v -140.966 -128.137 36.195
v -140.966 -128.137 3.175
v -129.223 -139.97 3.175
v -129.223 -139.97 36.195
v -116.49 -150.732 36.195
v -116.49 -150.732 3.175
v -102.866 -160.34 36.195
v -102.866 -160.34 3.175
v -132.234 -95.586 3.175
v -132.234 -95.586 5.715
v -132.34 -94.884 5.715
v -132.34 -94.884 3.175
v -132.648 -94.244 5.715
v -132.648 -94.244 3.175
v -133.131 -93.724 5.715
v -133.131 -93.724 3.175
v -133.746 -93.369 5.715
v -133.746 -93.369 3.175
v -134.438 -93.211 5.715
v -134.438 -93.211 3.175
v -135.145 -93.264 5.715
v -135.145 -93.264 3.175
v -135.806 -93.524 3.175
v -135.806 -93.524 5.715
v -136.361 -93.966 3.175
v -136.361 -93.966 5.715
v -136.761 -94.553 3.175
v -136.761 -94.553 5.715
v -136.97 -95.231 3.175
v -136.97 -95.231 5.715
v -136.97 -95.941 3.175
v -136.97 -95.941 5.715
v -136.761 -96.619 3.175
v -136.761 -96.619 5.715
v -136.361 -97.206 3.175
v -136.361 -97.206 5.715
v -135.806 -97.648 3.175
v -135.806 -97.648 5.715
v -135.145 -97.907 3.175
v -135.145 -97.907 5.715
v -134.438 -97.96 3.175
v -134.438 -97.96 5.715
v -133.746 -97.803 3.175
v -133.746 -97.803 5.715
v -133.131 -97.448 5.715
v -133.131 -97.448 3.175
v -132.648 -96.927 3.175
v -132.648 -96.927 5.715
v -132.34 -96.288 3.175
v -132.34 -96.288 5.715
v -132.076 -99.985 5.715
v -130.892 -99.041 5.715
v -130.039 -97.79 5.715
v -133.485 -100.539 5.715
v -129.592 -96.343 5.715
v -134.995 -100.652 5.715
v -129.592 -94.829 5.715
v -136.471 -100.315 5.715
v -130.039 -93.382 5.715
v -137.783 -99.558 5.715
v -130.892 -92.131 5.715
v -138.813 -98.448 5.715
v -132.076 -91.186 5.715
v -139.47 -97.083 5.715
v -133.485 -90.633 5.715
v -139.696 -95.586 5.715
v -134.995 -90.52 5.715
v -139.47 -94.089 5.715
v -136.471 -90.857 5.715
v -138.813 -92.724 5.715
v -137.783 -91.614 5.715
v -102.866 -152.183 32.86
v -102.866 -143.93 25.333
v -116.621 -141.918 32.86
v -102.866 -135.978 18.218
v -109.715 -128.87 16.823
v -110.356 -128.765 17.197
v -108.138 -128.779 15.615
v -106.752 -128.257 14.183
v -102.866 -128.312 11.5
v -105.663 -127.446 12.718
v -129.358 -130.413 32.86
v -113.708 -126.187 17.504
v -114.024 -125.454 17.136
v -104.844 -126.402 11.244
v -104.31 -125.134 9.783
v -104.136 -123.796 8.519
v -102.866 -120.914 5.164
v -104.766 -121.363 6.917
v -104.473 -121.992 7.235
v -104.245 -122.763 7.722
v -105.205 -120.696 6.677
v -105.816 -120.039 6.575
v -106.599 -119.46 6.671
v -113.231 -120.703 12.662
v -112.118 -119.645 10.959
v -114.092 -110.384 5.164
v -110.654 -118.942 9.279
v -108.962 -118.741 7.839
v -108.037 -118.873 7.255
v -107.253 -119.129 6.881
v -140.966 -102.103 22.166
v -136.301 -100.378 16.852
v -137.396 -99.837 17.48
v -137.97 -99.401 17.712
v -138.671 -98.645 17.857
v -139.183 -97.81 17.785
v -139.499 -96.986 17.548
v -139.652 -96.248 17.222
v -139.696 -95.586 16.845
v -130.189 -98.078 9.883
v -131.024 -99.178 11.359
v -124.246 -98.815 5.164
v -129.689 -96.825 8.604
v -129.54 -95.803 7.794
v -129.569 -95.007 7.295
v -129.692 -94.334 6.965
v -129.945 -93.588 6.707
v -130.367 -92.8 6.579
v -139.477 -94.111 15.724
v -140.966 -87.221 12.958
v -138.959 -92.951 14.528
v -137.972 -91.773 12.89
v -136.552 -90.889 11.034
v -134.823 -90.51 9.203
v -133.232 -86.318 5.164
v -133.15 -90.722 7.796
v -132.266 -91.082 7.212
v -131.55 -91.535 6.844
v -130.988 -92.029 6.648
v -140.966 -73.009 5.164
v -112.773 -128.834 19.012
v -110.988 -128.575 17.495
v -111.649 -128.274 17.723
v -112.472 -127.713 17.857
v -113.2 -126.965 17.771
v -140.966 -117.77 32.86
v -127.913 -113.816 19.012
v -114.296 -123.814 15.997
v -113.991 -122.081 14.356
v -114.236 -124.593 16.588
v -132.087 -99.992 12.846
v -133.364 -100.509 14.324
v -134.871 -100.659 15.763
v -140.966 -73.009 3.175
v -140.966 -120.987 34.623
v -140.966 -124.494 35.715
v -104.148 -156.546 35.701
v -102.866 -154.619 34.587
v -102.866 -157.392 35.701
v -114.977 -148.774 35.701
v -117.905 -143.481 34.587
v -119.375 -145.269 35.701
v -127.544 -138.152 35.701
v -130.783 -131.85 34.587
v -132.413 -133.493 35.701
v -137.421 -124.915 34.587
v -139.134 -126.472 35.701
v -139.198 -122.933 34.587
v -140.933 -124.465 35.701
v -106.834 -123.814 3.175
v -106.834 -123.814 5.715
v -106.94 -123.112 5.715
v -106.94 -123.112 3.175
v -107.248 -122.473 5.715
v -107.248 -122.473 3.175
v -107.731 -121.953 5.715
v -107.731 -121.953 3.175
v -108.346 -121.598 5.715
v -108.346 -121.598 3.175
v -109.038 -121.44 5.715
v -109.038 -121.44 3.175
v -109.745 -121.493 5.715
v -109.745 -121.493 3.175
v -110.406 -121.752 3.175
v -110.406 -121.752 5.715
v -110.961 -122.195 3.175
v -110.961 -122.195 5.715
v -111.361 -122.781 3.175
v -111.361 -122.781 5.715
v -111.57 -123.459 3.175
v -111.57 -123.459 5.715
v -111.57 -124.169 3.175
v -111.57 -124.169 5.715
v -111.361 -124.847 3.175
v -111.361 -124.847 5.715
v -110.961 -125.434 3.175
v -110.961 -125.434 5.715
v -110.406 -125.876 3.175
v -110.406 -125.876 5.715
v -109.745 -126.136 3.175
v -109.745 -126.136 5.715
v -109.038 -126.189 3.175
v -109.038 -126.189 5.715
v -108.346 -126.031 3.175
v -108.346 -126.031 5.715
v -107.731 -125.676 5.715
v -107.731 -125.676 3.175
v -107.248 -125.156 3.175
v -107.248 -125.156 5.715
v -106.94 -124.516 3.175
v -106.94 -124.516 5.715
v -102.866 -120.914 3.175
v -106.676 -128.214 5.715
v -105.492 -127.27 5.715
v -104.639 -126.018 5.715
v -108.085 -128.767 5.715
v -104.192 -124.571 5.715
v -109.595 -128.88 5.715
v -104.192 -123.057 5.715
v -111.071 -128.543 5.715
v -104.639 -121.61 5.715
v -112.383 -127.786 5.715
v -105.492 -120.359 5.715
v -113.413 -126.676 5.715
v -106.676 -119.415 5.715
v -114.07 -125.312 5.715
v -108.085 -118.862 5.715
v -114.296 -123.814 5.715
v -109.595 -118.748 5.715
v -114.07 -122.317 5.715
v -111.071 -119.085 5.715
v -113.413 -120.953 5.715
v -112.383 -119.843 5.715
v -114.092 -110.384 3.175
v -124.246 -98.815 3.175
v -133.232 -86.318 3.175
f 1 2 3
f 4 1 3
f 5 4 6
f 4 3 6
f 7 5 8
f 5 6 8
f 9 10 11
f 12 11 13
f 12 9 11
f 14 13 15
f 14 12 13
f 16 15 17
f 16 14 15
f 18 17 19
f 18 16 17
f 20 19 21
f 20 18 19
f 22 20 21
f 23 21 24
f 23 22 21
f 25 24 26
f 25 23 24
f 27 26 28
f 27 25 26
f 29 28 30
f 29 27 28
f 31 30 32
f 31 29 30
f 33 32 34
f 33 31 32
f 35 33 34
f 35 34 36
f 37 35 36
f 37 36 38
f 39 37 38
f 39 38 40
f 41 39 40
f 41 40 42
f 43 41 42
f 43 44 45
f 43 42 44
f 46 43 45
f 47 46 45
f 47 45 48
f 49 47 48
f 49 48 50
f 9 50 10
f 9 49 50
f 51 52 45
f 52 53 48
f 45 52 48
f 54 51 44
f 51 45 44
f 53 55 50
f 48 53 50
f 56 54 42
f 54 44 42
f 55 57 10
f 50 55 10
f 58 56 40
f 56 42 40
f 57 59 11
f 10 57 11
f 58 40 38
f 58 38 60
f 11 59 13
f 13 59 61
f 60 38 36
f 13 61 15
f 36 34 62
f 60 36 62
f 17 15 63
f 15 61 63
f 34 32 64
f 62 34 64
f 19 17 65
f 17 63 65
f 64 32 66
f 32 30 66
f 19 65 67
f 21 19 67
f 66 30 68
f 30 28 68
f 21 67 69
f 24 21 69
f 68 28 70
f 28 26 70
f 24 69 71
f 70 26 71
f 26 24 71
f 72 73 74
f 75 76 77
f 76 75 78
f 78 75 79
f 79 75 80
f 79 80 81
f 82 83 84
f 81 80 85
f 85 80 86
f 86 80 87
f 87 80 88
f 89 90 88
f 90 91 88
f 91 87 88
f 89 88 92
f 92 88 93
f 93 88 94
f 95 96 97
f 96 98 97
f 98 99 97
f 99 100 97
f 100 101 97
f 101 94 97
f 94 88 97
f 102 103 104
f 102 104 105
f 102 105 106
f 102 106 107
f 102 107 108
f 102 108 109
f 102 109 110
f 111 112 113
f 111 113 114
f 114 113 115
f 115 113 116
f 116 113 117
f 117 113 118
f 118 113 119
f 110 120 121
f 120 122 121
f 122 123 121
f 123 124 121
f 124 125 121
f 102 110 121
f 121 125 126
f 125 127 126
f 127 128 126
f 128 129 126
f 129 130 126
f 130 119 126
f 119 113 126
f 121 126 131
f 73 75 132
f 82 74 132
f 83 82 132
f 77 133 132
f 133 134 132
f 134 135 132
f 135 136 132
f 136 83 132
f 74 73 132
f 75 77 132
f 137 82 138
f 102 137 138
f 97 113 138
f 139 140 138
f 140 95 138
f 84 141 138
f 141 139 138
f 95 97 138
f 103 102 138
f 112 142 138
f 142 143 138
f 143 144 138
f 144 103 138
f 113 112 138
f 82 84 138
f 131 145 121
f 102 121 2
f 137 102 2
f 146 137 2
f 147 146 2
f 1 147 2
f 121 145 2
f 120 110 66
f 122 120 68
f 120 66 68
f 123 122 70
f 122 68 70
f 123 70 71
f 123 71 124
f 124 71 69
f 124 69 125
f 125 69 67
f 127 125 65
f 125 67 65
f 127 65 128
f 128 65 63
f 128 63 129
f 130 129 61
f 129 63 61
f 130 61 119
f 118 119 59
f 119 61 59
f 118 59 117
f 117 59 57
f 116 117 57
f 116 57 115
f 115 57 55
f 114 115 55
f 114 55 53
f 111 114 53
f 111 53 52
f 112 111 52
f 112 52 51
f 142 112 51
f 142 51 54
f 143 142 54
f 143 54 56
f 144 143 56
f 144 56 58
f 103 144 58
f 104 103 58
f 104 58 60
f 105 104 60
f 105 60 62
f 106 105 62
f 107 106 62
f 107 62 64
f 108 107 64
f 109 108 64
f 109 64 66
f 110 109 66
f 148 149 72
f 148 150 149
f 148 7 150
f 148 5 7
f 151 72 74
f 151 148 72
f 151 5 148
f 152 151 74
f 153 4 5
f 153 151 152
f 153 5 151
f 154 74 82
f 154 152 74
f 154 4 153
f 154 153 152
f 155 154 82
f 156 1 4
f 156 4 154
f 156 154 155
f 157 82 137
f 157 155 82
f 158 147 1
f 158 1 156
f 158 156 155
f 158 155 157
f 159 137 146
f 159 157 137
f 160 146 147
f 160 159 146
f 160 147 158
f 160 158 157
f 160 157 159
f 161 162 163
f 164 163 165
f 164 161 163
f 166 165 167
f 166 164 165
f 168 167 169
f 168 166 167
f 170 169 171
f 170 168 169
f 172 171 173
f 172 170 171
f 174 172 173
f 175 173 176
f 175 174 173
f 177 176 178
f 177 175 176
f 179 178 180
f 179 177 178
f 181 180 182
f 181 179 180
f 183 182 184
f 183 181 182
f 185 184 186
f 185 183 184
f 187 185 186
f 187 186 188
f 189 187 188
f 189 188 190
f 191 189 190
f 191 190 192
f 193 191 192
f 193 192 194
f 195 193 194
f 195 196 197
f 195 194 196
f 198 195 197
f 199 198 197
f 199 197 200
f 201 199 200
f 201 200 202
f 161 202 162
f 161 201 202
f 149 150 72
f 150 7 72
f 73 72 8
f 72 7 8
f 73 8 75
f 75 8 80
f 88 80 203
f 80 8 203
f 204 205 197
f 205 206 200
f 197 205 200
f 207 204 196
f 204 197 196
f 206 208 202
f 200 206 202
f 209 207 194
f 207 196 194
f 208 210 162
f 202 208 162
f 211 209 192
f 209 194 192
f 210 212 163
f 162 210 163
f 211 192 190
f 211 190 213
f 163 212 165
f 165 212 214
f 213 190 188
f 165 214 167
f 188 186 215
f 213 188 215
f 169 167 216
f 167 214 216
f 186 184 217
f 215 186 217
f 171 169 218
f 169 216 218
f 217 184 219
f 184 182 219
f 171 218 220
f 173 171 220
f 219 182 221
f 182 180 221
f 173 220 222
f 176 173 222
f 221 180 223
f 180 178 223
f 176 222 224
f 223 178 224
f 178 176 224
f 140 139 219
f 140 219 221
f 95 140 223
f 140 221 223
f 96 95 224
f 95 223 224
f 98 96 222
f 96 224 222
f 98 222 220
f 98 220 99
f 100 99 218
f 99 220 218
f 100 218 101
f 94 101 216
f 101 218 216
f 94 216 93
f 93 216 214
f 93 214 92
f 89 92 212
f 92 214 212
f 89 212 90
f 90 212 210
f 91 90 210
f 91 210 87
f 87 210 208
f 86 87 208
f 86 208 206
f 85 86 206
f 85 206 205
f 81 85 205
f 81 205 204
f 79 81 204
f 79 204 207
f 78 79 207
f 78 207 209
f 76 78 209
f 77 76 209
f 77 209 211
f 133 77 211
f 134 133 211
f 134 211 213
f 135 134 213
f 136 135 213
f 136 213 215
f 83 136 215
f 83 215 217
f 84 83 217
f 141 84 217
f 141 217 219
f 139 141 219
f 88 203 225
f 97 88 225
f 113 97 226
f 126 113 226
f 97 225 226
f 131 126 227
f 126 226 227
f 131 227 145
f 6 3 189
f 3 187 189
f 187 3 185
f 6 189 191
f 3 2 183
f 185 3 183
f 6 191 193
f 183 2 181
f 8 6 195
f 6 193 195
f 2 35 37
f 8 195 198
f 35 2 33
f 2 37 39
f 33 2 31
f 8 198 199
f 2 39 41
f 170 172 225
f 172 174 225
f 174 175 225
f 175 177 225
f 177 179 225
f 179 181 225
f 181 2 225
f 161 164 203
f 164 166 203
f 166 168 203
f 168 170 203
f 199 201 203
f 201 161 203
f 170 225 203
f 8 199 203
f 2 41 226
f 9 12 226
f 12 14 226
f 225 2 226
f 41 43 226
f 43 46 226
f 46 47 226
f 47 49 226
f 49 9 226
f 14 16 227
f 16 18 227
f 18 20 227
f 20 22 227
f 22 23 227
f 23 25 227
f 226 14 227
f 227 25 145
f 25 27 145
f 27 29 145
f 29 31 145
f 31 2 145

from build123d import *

# Parameters (mm, degrees)
SKETCH1_R               = 2.38125
BOSS_EXTRUDE1_DEPTH     = 3.175
BOSS_EXTRUDE2_DEPTH     = 50.8
CUT_EXTRUDE1_DEPTH      = 209.526843613
CUT_EXTRUDE1_DEPTH_BACK = 209.526843613
SKETCH3_R               = 203.829254644
SKETCH3_R_2             = 174.625
SKETCH5_R               = 2.38125
CUT_EXTRUDE3_DEPTH      = 200.484174202
SKETCH6_W               = 205.731089426
SKETCH6_H               = 25.4
BOSS_EXTRUDE3_DEPTH     = 3.175
SKETCH8_R               = 2.38125
CUT_EXTRUDE5_DEPTH      = 200.484174202
SKETCH9_W               = 205.731089426
SKETCH9_H               = 38.1
BOSS_EXTRUDE4_DEPTH     = 3.175
SKETCH10_R              = 6.35
SKETCH10_R_2            = 2.38125
CUT_EXTRUDE6_DEPTH      = 200.484174202
SKETCH11_W              = 53.331089426
SKETCH11_H              = 31.75
BOSS_EXTRUDE5_DEPTH     = 3.175
FILLET1_R               = 10.16
SKETCH12_R              = 6.35
SKETCH12_R_2            = 2.38125
CUT_EXTRUDE7_DEPTH      = 200.484174202
FILLET2_R               = 2.54
CUT_EXTRUDE8_DEPTH      = 200.484174202
SKETCH14_W              = 2.759281453
SKETCH14_H              = 7.963584416
SKETCH14_W_2            = 2.527010149
SKETCH14_H_2            = 5.938870156
BOSS_EXTRUDE6_DEPTH     = 3.175
FILLET3_R               = 2.54
SKETCH15_R              = 2.38125
BOSS_EXTRUDE7_DEPTH     = 33.02
SKETCH16_R              = 227.754671792
SKETCH16_W              = 368.539826918
SKETCH16_H              = 147.114866813
CUT_EXTRUDE9_DEPTH      = 217.033643064
SKETCH17_R              = 87.195519402
CUT_EXTRUDE10_DEPTH     = 217.033642998
CHAMFER1_SIZE           = 27.94
CHAMFER1_SIZE_2         = 31.030513664
CUT_EXTRUDE12_START     = -2.54
SKETCH18_R              = 5.08
CUT_EXTRUDE12_DEPTH     = 33.02
FILLET4_R               = 10.16


with BuildPart() as part:
    # Sketch1 → Boss-Extrude1 (new body)
    with BuildSketch(Plane.XY):
        with BuildLine():
            Line((-102.865544713, 31.75), (-102.865544713, 145.022480019))
            ThreePointArc((-102.865544713, 145.022480019), (-123.286100955, 128.114703728), (-140.965544713, 108.358457002))
            Line((-140.965544713, 108.358457002), (-140.965544713, -108.358457002))
            ThreePointArc((-140.965544713, -108.358457002), (-123.286100955, -128.114703728), (-102.865544713, -145.022480019))
            Line((-102.865544713, -145.022480019), (-102.865544713, -69.85))
            Line((-102.865544713, -69.85), (102.865544713, -69.85))
            Line((102.865544713, -69.85), (102.865544713, -145.022480019))
            ThreePointArc((102.865544713, -145.022480019), (123.286100955, -128.114703728), (140.965544713, -108.358457002))
            Line((140.965544713, -108.358457002), (140.965544713, 108.358457002))
            ThreePointArc((140.965544713, 108.358457002), (123.286100955, 128.114703728), (102.865544713, 145.022480019))
            Line((102.865544713, 145.022480019), (102.865544713, 31.75))
            Line((102.865544713, 31.75), (-102.865544713, 31.75))
        make_face()
        with Locations((25.4, -38.1)):
            Circle(SKETCH1_R, mode=Mode.SUBTRACT)
        with Locations((-25.4, -38.1)):
            Circle(SKETCH1_R, mode=Mode.SUBTRACT)
        with Locations((0, -38.1)):
            Circle(SKETCH1_R, mode=Mode.SUBTRACT)
    extrude(amount=BOSS_EXTRUDE1_DEPTH)

    # Sketch2 → Boss-Extrude2 (add)
    with BuildSketch(Plane.XY.offset(3.175)):
        with BuildLine():
            ThreePointArc((-102.865544713, -141.111907137), (-123.390730203, -123.566250752), (-140.965544713, -103.06602655))
            Line((-140.965544713, -103.06602655), (-140.965544713, -108.358457002))
            ThreePointArc((-140.965544713, -108.358457002), (-123.286100955, -128.114703728), (-102.865544713, -145.022480019))
            Line((-102.865544713, -145.022480019), (-102.865544713, -141.111907137))
        make_face()
        with BuildLine():
            ThreePointArc((140.965544713, -103.06602655), (123.390730203, -123.566250752), (102.865544713, -141.111907137))
            Line((102.865544713, -141.111907137), (102.865544713, -145.022480019))
            ThreePointArc((102.865544713, -145.022480019), (123.286100955, -128.114703728), (140.965544713, -108.358457002))
            Line((140.965544713, -108.358457002), (140.965544713, -103.06602655))
        make_face()
    extrude(amount=BOSS_EXTRUDE2_DEPTH)

    # Sketch3 → Cut-Extrude1 (cut, two sides: drawn at the far end of the back side and taken through both)
    with BuildSketch(Plane.XY.offset(3.175).offset(-CUT_EXTRUDE1_DEPTH_BACK)):
        Circle(SKETCH3_R)
        Circle(SKETCH3_R_2, mode=Mode.SUBTRACT)
    extrude(amount=CUT_EXTRUDE1_DEPTH + CUT_EXTRUDE1_DEPTH_BACK, mode=Mode.SUBTRACT)

    # Sketch5 → Cut-Extrude3 (cut, through all)
    with BuildSketch(Plane.XY.offset(3.175)):
        with Locations((134.615544713, -95.585904409)):
            Circle(SKETCH5_R)
        with Locations((109.215544713, -123.814275401)):
            Circle(SKETCH5_R)
        with Locations(Location((-134.615544713, -95.585904409, 0), (0, 0, 180))):
            Circle(SKETCH5_R)
        with Locations(Location((-109.215544713, -123.814275401, 0), (0, 0, 180))):
            Circle(SKETCH5_R)
    extrude(amount=-CUT_EXTRUDE3_DEPTH, mode=Mode.SUBTRACT)

    # Sketch6 → Boss-Extrude3 (add)
    with BuildSketch(Plane.XY.offset(3.175)):
        with Locations((0, 77.611907137)):
            Rectangle(SKETCH6_W, SKETCH6_H)
    extrude(amount=-BOSS_EXTRUDE3_DEPTH)

    # Sketch8 → Cut-Extrude5 (cut, through all)
    with BuildSketch(Plane.XY.offset(3.175)):
        with Locations((-38.1, -38.1)):
            Circle(SKETCH8_R)
        with Locations((-50.8, -38.1)):
            Circle(SKETCH8_R)
        with Locations((12.7, -38.1)):
            Circle(SKETCH8_R)
        with Locations((-12.7, -38.1)):
            Circle(SKETCH8_R)
    extrude(amount=-CUT_EXTRUDE5_DEPTH, mode=Mode.SUBTRACT)

    # Sketch9 → Boss-Extrude4 (add)
    with BuildSketch(Plane.XY.offset(3.175)):
        with Locations((0, -88.9)):
            Rectangle(SKETCH9_W, SKETCH9_H)
    extrude(amount=-BOSS_EXTRUDE4_DEPTH)

    # Sketch10 → Cut-Extrude6 (cut, through all)
    with BuildSketch(Plane.XY.offset(3.175)):
        with Locations((0, -76.2)):
            Circle(SKETCH10_R)
        with Locations((-25.4, -76.2)):
            Circle(SKETCH10_R_2)
        with Locations((-38.1, -76.2)):
            Circle(SKETCH10_R_2)
        with Locations((25.4, -76.2)):
            Circle(SKETCH10_R_2)
    extrude(amount=-CUT_EXTRUDE6_DEPTH, mode=Mode.SUBTRACT)

    # Sketch11 → Boss-Extrude5 (add)
    with BuildSketch(Plane.XY.offset(3.175)):
        with Locations((0, -123.825)):
            Rectangle(SKETCH11_W, SKETCH11_H)
    extrude(amount=-BOSS_EXTRUDE5_DEPTH)

    # Fillet1
    fillet1_edges = [part.edges().sort_by_distance(p)[0] for p in [
        (-26.665544713, -139.7, 1.5875),
        (-26.665544713, -107.95, 1.5875),
        (26.665544713, -107.95, 1.5875),
        (26.665544713, -139.7, 1.5875),
    ]]
    fillet(fillet1_edges, radius=FILLET1_R)

    # Sketch12 → Cut-Extrude7 (cut, through all)
    with BuildSketch(Plane.XY.offset(3.175)):
        with Locations((-25.4, -76.2)):
            Circle(SKETCH12_R)
        with Locations((25.4, -76.2)):
            Circle(SKETCH12_R)
        with Locations((-8.66775, -67.53225)):
            Circle(SKETCH12_R_2)
        with Locations((8.66775, -67.53225)):
            Circle(SKETCH12_R_2)
        with Locations((8.66775, -84.86775)):
            Circle(SKETCH12_R_2)
        with Locations((-8.66775, -84.86775)):
            Circle(SKETCH12_R_2)
    extrude(amount=-CUT_EXTRUDE7_DEPTH, mode=Mode.SUBTRACT)

    # Fillet2
    fillet2_edges = [part.edges().sort_by_distance(p)[0] for p in [
        (-102.865544713, 141.111907137, 1.5875),
        (102.865544713, 141.111907137, 1.5875),
    ]]
    fillet(fillet2_edges, radius=FILLET2_R)

    # Sketch13 → Cut-Extrude8 (cut, through all)
    # profile 1 of 4: a face of its own
    with BuildSketch(Plane.XY.offset(3.175)):
        with BuildLine():
            Line((-29.807958333, -15.810565048), (-38.216416667, -15.810565048))
            Line((-38.216416667, -15.810565048), (-33.538583333, 6.245101619))
            Line((-33.538583333, 6.245101619), (-38.803791667, 6.245101619))
            Line((-38.803791667, 6.245101619), (-39.682208333, 2.075268285))
            Line((-39.682208333, 2.075268285), (-48.095958333, 2.075268285))
            Line((-48.095958333, 2.075268285), (-47.397458333, 5.477809952))
            add(Edge.make_bspline(
                [(-47.397458333, 5.477809952), (-47.320569058, 5.758194134), (-47.170922216, 6.303895823), (-46.789013651, 7.053374007), (-46.29771223, 7.715065901), (-45.690436731, 8.272796577), (-45.006500067, 8.730292102), (-44.253147871, 9.054960677), (-43.448405111, 9.260244914), (-42.891974442, 9.282012228), (-42.6085, 9.293101619)],
                knots=[0, 0, 0, 0, 1.050168006, 2.043904372, 3.024673376, 4.01863537, 5.013909092, 5.989008141, 6.975497172, 8, 8, 8, 8], degree=3))
            Line((-42.6085, 9.293101619), (-24.463375, 9.293101619))
            Line((-24.463375, 9.293101619), (-29.807958333, -15.810565048))
        make_face()
    # profile 2 of 4: a face of its own
    with BuildSketch(Plane.XY.offset(3.175)):
        with BuildLine():
            add(Edge.make_bspline(
                [(-3.566583333, -12.132856715), (-3.643765668, -12.421811436), (-3.79437451, -12.985659844), (-4.17293599, -13.764550451), (-4.665381385, -14.453577746), (-5.270434906, -15.036263062), (-5.950809803, -15.518035961), (-6.703009887, -15.859816489), (-7.511777843, -16.068702787), (-8.070292693, -16.093985699), (-8.355541667, -16.106898381)],
                knots=[0, 0, 0, 0, 1.062369753, 2.073042759, 3.062499936, 4.061251344, 5.048575831, 6.014824268, 6.986115874, 8, 8, 8, 8], degree=3))
            Line((-8.355541667, -16.106898381), (-22.547791667, -16.106898381))
            add(Edge.make_bspline(
                [(-22.547791667, -16.106898381), (-22.69262218, -16.104596964), (-22.972752339, -16.100145578), (-23.378206431, -16.044702396), (-23.755568174, -15.960682303), (-24.107157142, -15.846746121), (-24.426210233, -15.691540895), (-24.716954418, -15.504453058), (-24.976786635, -15.281711317), (-25.203806964, -15.025677099), (-25.40308213, -14.746169713), (-25.554358436, -14.435544628), (-25.674211179, -14.106195373), (-25.74344938, -13.752832717), (-25.791514529, -13.37950469), (-25.77975916, -12.981941289), (-25.73922686, -12.562383844), (-25.682974686, -12.278883611), (-25.654, -12.132856715)],
                knots=[0, 0, 0, 0, 1.158779845, 2.241303809, 3.269110906, 4.251580925, 5.192683609, 6.101443689, 7.012833415, 7.922909267, 8.835720222, 9.751475912, 10.680528402, 11.633319635, 12.628295421, 13.687540584, 14.808885378, 16, 16, 16, 16], degree=3))
            Line((-25.654, -12.132856715), (-21.997458333, 5.319059952))
            add(Edge.make_bspline(
                [(-21.997458333, 5.319059952), (-21.920272116, 5.608009048), (-21.769655695, 6.171846477), (-21.391148554, 6.950815808), (-20.898502375, 7.639552216), (-20.293153244, 8.224337096), (-19.608609326, 8.702683082), (-18.855913228, 9.046275843), (-18.048644228, 9.254382857), (-17.4919553, 9.28003834), (-17.2085, 9.293101619)],
                knots=[0, 0, 0, 0, 1.062516124, 2.073328378, 3.062921881, 4.061810895, 5.05442655, 6.020808115, 6.992233544, 8, 8, 8, 8], degree=3))
            Line((-17.2085, 9.293101619), (-3.01625, 9.293101619))
            add(Edge.make_bspline(
                [(-3.01625, 9.293101619), (-2.871419505, 9.290800192), (-2.591289383, 9.286348788), (-2.185835038, 9.230905733), (-1.808474182, 9.146885197), (-1.456882118, 9.03295056), (-1.137839887, 8.877739913), (-0.847056821, 8.690671483), (-0.587369032, 8.467857656), (-0.359809395, 8.212092615), (-0.16209325, 7.930921186), (-0.002983257, 7.623293687), (0.114459046, 7.2921344), (0.187047795, 6.939473562), (0.223589985, 6.565305639), (0.223678302, 6.168188246), (0.179743785, 5.748571863), (0.123975462, 5.465081675), (0.09525, 5.319059952)],
                knots=[0, 0, 0, 0, 1.158432062, 2.24063113, 3.268129752, 4.250304904, 5.191125136, 6.099612471, 7.010728663, 7.920531375, 8.833068369, 9.75494936, 10.683723015, 11.636228288, 12.62940148, 13.688234619, 14.809242866, 16, 16, 16, 16], degree=3))
            Line((0.09525, 5.319059952), (-3.566583333, -12.132856715))
        make_face()
        Polygon((-13.403791667, 6.245101619), (-17.425458333, -13.058898381), (-12.16025, -13.058898381), (-8.138583333, 6.245101619), align=None, mode=Mode.SUBTRACT)
    # profile 3 of 4: a face of its own
    with BuildSketch(Plane.XY.offset(3.175)):
        with BuildLine():
            Line((11.557, 9.293101619), (8.556625, -5.269565048))
            Line((8.556625, -5.269565048), (13.827125, -5.269565048))
            Line((13.827125, -5.269565048), (16.8275, 9.293101619))
            Line((16.8275, 9.293101619), (25.235958333, 9.293101619))
            Line((25.235958333, 9.293101619), (19.896666667, -16.106898381))
            Line((19.896666667, -16.106898381), (11.482916667, -16.106898381))
            Line((11.482916667, -16.106898381), (13.165666667, -8.317565048))
            Line((13.165666667, -8.317565048), (3.439583333, -8.317565048))
            add(Edge.make_bspline(
                [(3.439583333, -8.317565048), (3.294736233, -8.315312365), (3.014573993, -8.310955241), (2.609344629, -8.25485176), (2.230636814, -8.173029355), (1.881290806, -8.050712181), (1.561052368, -7.897312045), (1.270346477, -7.709804396), (1.009103929, -7.48515858), (0.777806767, -7.227358437), (0.580756638, -6.941550122), (0.426179112, -6.6292081), (0.309007624, -6.297036788), (0.237889907, -5.94070984), (0.190785312, -5.563660832), (0.202000265, -5.162620664), (0.243321079, -4.739613917), (0.29915982, -4.45427987), (0.328083333, -4.306481715)],
                knots=[0, 0, 0, 0, 1.152191709, 2.228561082, 3.250524676, 4.231939746, 5.167691878, 6.071285285, 6.977493388, 7.902223819, 8.821393841, 9.731943086, 10.66895861, 11.616332835, 12.619603957, 13.686867372, 14.801836863, 16, 16, 16, 16], degree=3))
            Line((0.328083333, -4.306481715), (3.14325, 9.293101619))
            Line((3.14325, 9.293101619), (11.557, 9.293101619))
        make_face()
    # profile 4 of 4: a face of its own
    with BuildSketch(Plane.XY.offset(3.175)):
        with BuildLine():
            Line((33.374541667, -13.058898381), (47.0535, -13.058898381))
            Line((47.0535, -13.058898381), (46.392041667, -16.106898381))
            Line((46.392041667, -16.106898381), (24.304625, -16.106898381))
            Line((24.304625, -16.106898381), (25.802166667, -9.143065048))
            add(Edge.make_bspline(
                [(25.802166667, -9.143065048), (25.879273752, -8.861031474), (26.029757165, -8.310610268), (26.410334887, -7.552072135), (26.901419327, -6.879703753), (27.508831265, -6.311820899), (28.191228528, -5.842472815), (28.946271137, -5.513745702), (29.752164487, -5.300517366), (30.311046908, -5.28002739), (30.596416667, -5.269565048)],
                knots=[0, 0, 0, 0, 1.049169808, 2.047576474, 3.031944376, 4.027910562, 5.023553593, 5.994653504, 6.976054309, 8, 8, 8, 8], degree=3))
            Line((30.596416667, -5.269565048), (40.3225, -5.269565048))
            Line((40.3225, -5.269565048), (42.661416667, 6.245101619))
            Line((42.661416667, 6.245101619), (37.396208333, 6.245101619))
            Line((37.396208333, 6.245101619), (36.517791667, 2.075268285))
            Line((36.517791667, 2.075268285), (28.104041667, 2.075268285))
            Line((28.104041667, 2.075268285), (28.802541667, 5.477809952))
            add(Edge.make_bspline(
                [(28.802541667, 5.477809952), (28.879430942, 5.758194134), (29.029077784, 6.303895823), (29.410986349, 7.053374007), (29.90228777, 7.715065901), (30.509563269, 8.272796577), (31.193499933, 8.730292102), (31.946852129, 9.054960677), (32.751594889, 9.260244914), (33.308025558, 9.282012228), (33.5915, 9.293101619)],
                knots=[0, 0, 0, 0, 1.050168006, 2.043904372, 3.024673376, 4.01863537, 5.013909092, 5.989008141, 6.975497172, 8, 8, 8, 8], degree=3))
            Line((33.5915, 9.293101619), (47.78375, 9.293101619))
            add(Edge.make_bspline(
                [(47.78375, 9.293101619), (47.92859726, 9.290849086), (48.208759811, 9.286492252), (48.613987002, 9.230386738), (48.992702458, 9.148571481), (49.342021711, 9.026229282), (49.662353678, 8.87291663), (49.952725098, 8.685096123), (50.214324347, 8.462382804), (50.440285412, 8.20121114), (50.636405741, 7.915869715), (50.798510828, 7.606235104), (50.913345969, 7.272328086), (50.987754572, 6.916671215), (51.023365934, 6.538801464), (51.023963511, 6.138199286), (50.97928388, 5.715135649), (50.923924969, 5.429811378), (50.89525, 5.282018285)],
                knots=[0, 0, 0, 0, 1.152517565, 2.229191352, 3.251443972, 4.233136601, 5.169153376, 6.073002333, 6.979466726, 7.895134038, 8.814564014, 9.731738245, 10.66901877, 11.616660927, 12.618740334, 13.686213184, 14.801498005, 16, 16, 16, 16], degree=3))
            Line((50.89525, 5.282018285), (48.916166667, -4.306481715))
            add(Edge.make_bspline(
                [(48.916166667, -4.306481715), (48.838706266, -4.597052385), (48.687148602, -5.165577869), (48.311448965, -5.952788492), (47.817473721, -6.648200027), (47.212376239, -7.235653604), (46.533647997, -7.724482215), (45.778706123, -8.063324207), (44.971906745, -8.281163221), (44.41262475, -8.30526518), (44.127208333, -8.317565048)],
                knots=[0, 0, 0, 0, 1.06412456, 2.082047477, 3.072647496, 4.071792832, 5.058775816, 6.021176094, 6.990153746, 8, 8, 8, 8], degree=3))
            Line((44.127208333, -8.317565048), (34.395833333, -8.317565048))
            Line((34.395833333, -8.317565048), (33.374541667, -13.058898381))
        make_face()
    extrude(amount=-CUT_EXTRUDE8_DEPTH, mode=Mode.SUBTRACT)


with BuildPart() as cut_extrude8_piece_1:
    # of the separate pieces the step leaves, piece 1, a body of its own (cut_extrude8_pieces)
    add(part.part.solids().sort_by_distance((-106.961346111, 138.033188267, 0))[0])



with BuildPart() as cut_extrude8_piece_2:
    # of the separate pieces the step leaves, piece 2, a body of its own (cut_extrude8_pieces)
    add(part.part.solids().sort_by_distance((-8.138583333, 6.245101619, 0))[0])


with BuildPart() as cut_extrude8_piece_1_1:
    add(cut_extrude8_piece_1.part)

    add(cut_extrude8_piece_2.part)  # Boss-Extrude6 merges Cut-Extrude8 piece 2
    # Sketch14 → Boss-Extrude6 (add)
    with BuildSketch(Plane.XY.offset(3.175)):
        with Locations((-11.017521916, 7.88967512)):
            Rectangle(SKETCH14_W, SKETCH14_H)
        with Locations((-14.795211944, -14.779945163)):
            Rectangle(SKETCH14_W_2, SKETCH14_H_2)
    extrude(amount=-BOSS_EXTRUDE6_DEPTH)

    # Fillet3
    fillet3_edges = [cut_extrude8_piece_1_1.edges().sort_by_distance(p)[0] for p in [
        (102.865544713, 90.311907137, 1.5875),
        (102.865544713, 31.75, 1.5875),
        (-102.865544713, 64.911907137, 1.5875),
        (-102.865544713, 31.75, 1.5875),
        (-102.865544713, 90.311907137, 1.5875),
        (102.865544713, 64.911907137, 1.5875),
    ]]
    fillet(fillet3_edges, radius=FILLET3_R)

    # Sketch15 → Boss-Extrude7 (add)
    # profile 1 of 2: a face of its own
    with BuildSketch(Plane.XY.offset(3.175)):
        with BuildLine():
            ThreePointArc((-102.865544713, -120.914193587), (-124.246259111, -98.815128381), (-140.965544713, -73.008750871))
            Line((-140.965544713, -73.008750871), (-140.965544713, -128.136510034))
            ThreePointArc((-140.965544713, -128.136510034), (-122.97425317, -145.49083496), (-102.865544713, -160.340044003))
            Line((-102.865544713, -160.340044003), (-102.865544713, -120.914193587))
        make_face()
        with Locations((-109.215544713, -123.814275401)):
            Circle(SKETCH15_R, mode=Mode.SUBTRACT)
        with Locations((-134.615544713, -95.585904409)):
            Circle(SKETCH15_R, mode=Mode.SUBTRACT)
    # profile 2 of 2: a face of its own
    with BuildSketch(Plane.XY.offset(3.175)):
        with BuildLine():
            Line((140.965544713, -128.136510034), (140.965544713, -73.008750871))
            ThreePointArc((140.965544713, -73.008750871), (124.246259111, -98.815128381), (102.865544713, -120.914193587))
            Line((102.865544713, -120.914193587), (102.865544713, -160.340044003))
            ThreePointArc((102.865544713, -160.340044003), (122.97425317, -145.49083496), (140.965544713, -128.136510034))
        make_face()
        with Locations((109.215544713, -123.814275401)):
            Circle(SKETCH15_R, mode=Mode.SUBTRACT)
        with Locations((134.615544713, -95.585904409)):
            Circle(SKETCH15_R, mode=Mode.SUBTRACT)
    extrude(amount=BOSS_EXTRUDE7_DEPTH)

    # Sketch16 → Cut-Extrude9 (cut, through all)
    with BuildSketch(Plane.XY.offset(3.175)):
        Circle(SKETCH16_R)
        with Locations((23.411183864, 115.93750226)):
            Rectangle(SKETCH16_W, SKETCH16_H)
    extrude(amount=-CUT_EXTRUDE9_DEPTH, mode=Mode.SUBTRACT)


with BuildPart() as cut_extrude9_piece_1:
    # of the separate pieces the step leaves, piece 1, a body of its own (cut_extrude9_pieces)
    add(cut_extrude8_piece_1_1.part.solids().sort_by_distance((-140.965544713, -128.136510034, 3.175))[0])

    # Chamfer1
    # the kernel refuses this chamfer: 31.030513664, 27.94 mm, written as the material it takes off along each edge
    with BuildSketch(Plane(origin=(0, 0, 36.195), x_dir=(-0.20017923188636447, -0.9797592944807337, 0), z_dir=(0.9797592944807337, -0.20017923188636447, 0))) as chamfer1_piece_1:
        Polygon((158.75 + CHAMFER1_SIZE, 0), (158.75, CHAMFER1_SIZE_2), (158.75, 0), align=None)
    revolve(axis=Axis((0, 0, 36.195), (0, 0, -1)), revolution_arc=79.913485183, mode=Mode.SUBTRACT)

    # Sketch18 → Cut-Extrude12 (cut)
    with BuildSketch(Plane(origin=(0, 0, 3.175), x_dir=(-1, 0, 0), z_dir=(0, 0, -1)).offset(CUT_EXTRUDE12_START)):
        with Locations((134.615544713, -95.585904409)):
            Circle(SKETCH18_R)
        with Locations((109.215544713, -123.814275401)):
            Circle(SKETCH18_R)
    extrude(amount=-CUT_EXTRUDE12_DEPTH, mode=Mode.SUBTRACT)

    # Fillet4
    # the kernel refuses this fillet: 10.16 mm, written as the material it takes off along each edge
    with BuildSketch(Plane(origin=(0, 0, 36.195), x_dir=(-0.4998842027499923, -0.8660922490364434, 0), z_dir=(0.8660922490364434, -0.4998842027499923, 0))) as fillet4_piece_1:
        with BuildLine():
            CenterArc((191.237667396, 10.133185423), FILLET4_R, 222, 43.836372996)
            Line((183.68731597, 3.334818462), (183.536308941, 3.198851123))
            Line((183.536308941, 3.198851123), (186.538992971, -0.135967339))
            Line((186.538992971, -0.135967339), (186.69, -0.2032))
            ThreePointArc((186.69, -0.2032), (188.595, -0.2032), (190.485246652, -0.202663708))
            Line((190.485246652, -0.202663708), (190.5, 0))
        make_face()
    revolve(axis=Axis((0, 0, 36.195), (0, 0, -1)), revolution_arc=22.482929592, mode=Mode.SUBTRACT)


with BuildPart() as cut_extrude9_piece_2:
    # of the separate pieces the step leaves, piece 2, a body of its own (cut_extrude9_pieces)
    add(cut_extrude8_piece_1_1.part.solids().sort_by_distance((140.965544713, -73.008750871, 3.175))[0])

    # Sketch17 → Cut-Extrude10 (cut, through all)
    with BuildSketch(Plane.XY.offset(36.195)):
        with Locations((124.015012721, -121.332950523)):
            Circle(SKETCH17_R)
    extrude(amount=-CUT_EXTRUDE10_DEPTH, mode=Mode.SUBTRACT)


solid = cut_extrude9_piece_1.part
